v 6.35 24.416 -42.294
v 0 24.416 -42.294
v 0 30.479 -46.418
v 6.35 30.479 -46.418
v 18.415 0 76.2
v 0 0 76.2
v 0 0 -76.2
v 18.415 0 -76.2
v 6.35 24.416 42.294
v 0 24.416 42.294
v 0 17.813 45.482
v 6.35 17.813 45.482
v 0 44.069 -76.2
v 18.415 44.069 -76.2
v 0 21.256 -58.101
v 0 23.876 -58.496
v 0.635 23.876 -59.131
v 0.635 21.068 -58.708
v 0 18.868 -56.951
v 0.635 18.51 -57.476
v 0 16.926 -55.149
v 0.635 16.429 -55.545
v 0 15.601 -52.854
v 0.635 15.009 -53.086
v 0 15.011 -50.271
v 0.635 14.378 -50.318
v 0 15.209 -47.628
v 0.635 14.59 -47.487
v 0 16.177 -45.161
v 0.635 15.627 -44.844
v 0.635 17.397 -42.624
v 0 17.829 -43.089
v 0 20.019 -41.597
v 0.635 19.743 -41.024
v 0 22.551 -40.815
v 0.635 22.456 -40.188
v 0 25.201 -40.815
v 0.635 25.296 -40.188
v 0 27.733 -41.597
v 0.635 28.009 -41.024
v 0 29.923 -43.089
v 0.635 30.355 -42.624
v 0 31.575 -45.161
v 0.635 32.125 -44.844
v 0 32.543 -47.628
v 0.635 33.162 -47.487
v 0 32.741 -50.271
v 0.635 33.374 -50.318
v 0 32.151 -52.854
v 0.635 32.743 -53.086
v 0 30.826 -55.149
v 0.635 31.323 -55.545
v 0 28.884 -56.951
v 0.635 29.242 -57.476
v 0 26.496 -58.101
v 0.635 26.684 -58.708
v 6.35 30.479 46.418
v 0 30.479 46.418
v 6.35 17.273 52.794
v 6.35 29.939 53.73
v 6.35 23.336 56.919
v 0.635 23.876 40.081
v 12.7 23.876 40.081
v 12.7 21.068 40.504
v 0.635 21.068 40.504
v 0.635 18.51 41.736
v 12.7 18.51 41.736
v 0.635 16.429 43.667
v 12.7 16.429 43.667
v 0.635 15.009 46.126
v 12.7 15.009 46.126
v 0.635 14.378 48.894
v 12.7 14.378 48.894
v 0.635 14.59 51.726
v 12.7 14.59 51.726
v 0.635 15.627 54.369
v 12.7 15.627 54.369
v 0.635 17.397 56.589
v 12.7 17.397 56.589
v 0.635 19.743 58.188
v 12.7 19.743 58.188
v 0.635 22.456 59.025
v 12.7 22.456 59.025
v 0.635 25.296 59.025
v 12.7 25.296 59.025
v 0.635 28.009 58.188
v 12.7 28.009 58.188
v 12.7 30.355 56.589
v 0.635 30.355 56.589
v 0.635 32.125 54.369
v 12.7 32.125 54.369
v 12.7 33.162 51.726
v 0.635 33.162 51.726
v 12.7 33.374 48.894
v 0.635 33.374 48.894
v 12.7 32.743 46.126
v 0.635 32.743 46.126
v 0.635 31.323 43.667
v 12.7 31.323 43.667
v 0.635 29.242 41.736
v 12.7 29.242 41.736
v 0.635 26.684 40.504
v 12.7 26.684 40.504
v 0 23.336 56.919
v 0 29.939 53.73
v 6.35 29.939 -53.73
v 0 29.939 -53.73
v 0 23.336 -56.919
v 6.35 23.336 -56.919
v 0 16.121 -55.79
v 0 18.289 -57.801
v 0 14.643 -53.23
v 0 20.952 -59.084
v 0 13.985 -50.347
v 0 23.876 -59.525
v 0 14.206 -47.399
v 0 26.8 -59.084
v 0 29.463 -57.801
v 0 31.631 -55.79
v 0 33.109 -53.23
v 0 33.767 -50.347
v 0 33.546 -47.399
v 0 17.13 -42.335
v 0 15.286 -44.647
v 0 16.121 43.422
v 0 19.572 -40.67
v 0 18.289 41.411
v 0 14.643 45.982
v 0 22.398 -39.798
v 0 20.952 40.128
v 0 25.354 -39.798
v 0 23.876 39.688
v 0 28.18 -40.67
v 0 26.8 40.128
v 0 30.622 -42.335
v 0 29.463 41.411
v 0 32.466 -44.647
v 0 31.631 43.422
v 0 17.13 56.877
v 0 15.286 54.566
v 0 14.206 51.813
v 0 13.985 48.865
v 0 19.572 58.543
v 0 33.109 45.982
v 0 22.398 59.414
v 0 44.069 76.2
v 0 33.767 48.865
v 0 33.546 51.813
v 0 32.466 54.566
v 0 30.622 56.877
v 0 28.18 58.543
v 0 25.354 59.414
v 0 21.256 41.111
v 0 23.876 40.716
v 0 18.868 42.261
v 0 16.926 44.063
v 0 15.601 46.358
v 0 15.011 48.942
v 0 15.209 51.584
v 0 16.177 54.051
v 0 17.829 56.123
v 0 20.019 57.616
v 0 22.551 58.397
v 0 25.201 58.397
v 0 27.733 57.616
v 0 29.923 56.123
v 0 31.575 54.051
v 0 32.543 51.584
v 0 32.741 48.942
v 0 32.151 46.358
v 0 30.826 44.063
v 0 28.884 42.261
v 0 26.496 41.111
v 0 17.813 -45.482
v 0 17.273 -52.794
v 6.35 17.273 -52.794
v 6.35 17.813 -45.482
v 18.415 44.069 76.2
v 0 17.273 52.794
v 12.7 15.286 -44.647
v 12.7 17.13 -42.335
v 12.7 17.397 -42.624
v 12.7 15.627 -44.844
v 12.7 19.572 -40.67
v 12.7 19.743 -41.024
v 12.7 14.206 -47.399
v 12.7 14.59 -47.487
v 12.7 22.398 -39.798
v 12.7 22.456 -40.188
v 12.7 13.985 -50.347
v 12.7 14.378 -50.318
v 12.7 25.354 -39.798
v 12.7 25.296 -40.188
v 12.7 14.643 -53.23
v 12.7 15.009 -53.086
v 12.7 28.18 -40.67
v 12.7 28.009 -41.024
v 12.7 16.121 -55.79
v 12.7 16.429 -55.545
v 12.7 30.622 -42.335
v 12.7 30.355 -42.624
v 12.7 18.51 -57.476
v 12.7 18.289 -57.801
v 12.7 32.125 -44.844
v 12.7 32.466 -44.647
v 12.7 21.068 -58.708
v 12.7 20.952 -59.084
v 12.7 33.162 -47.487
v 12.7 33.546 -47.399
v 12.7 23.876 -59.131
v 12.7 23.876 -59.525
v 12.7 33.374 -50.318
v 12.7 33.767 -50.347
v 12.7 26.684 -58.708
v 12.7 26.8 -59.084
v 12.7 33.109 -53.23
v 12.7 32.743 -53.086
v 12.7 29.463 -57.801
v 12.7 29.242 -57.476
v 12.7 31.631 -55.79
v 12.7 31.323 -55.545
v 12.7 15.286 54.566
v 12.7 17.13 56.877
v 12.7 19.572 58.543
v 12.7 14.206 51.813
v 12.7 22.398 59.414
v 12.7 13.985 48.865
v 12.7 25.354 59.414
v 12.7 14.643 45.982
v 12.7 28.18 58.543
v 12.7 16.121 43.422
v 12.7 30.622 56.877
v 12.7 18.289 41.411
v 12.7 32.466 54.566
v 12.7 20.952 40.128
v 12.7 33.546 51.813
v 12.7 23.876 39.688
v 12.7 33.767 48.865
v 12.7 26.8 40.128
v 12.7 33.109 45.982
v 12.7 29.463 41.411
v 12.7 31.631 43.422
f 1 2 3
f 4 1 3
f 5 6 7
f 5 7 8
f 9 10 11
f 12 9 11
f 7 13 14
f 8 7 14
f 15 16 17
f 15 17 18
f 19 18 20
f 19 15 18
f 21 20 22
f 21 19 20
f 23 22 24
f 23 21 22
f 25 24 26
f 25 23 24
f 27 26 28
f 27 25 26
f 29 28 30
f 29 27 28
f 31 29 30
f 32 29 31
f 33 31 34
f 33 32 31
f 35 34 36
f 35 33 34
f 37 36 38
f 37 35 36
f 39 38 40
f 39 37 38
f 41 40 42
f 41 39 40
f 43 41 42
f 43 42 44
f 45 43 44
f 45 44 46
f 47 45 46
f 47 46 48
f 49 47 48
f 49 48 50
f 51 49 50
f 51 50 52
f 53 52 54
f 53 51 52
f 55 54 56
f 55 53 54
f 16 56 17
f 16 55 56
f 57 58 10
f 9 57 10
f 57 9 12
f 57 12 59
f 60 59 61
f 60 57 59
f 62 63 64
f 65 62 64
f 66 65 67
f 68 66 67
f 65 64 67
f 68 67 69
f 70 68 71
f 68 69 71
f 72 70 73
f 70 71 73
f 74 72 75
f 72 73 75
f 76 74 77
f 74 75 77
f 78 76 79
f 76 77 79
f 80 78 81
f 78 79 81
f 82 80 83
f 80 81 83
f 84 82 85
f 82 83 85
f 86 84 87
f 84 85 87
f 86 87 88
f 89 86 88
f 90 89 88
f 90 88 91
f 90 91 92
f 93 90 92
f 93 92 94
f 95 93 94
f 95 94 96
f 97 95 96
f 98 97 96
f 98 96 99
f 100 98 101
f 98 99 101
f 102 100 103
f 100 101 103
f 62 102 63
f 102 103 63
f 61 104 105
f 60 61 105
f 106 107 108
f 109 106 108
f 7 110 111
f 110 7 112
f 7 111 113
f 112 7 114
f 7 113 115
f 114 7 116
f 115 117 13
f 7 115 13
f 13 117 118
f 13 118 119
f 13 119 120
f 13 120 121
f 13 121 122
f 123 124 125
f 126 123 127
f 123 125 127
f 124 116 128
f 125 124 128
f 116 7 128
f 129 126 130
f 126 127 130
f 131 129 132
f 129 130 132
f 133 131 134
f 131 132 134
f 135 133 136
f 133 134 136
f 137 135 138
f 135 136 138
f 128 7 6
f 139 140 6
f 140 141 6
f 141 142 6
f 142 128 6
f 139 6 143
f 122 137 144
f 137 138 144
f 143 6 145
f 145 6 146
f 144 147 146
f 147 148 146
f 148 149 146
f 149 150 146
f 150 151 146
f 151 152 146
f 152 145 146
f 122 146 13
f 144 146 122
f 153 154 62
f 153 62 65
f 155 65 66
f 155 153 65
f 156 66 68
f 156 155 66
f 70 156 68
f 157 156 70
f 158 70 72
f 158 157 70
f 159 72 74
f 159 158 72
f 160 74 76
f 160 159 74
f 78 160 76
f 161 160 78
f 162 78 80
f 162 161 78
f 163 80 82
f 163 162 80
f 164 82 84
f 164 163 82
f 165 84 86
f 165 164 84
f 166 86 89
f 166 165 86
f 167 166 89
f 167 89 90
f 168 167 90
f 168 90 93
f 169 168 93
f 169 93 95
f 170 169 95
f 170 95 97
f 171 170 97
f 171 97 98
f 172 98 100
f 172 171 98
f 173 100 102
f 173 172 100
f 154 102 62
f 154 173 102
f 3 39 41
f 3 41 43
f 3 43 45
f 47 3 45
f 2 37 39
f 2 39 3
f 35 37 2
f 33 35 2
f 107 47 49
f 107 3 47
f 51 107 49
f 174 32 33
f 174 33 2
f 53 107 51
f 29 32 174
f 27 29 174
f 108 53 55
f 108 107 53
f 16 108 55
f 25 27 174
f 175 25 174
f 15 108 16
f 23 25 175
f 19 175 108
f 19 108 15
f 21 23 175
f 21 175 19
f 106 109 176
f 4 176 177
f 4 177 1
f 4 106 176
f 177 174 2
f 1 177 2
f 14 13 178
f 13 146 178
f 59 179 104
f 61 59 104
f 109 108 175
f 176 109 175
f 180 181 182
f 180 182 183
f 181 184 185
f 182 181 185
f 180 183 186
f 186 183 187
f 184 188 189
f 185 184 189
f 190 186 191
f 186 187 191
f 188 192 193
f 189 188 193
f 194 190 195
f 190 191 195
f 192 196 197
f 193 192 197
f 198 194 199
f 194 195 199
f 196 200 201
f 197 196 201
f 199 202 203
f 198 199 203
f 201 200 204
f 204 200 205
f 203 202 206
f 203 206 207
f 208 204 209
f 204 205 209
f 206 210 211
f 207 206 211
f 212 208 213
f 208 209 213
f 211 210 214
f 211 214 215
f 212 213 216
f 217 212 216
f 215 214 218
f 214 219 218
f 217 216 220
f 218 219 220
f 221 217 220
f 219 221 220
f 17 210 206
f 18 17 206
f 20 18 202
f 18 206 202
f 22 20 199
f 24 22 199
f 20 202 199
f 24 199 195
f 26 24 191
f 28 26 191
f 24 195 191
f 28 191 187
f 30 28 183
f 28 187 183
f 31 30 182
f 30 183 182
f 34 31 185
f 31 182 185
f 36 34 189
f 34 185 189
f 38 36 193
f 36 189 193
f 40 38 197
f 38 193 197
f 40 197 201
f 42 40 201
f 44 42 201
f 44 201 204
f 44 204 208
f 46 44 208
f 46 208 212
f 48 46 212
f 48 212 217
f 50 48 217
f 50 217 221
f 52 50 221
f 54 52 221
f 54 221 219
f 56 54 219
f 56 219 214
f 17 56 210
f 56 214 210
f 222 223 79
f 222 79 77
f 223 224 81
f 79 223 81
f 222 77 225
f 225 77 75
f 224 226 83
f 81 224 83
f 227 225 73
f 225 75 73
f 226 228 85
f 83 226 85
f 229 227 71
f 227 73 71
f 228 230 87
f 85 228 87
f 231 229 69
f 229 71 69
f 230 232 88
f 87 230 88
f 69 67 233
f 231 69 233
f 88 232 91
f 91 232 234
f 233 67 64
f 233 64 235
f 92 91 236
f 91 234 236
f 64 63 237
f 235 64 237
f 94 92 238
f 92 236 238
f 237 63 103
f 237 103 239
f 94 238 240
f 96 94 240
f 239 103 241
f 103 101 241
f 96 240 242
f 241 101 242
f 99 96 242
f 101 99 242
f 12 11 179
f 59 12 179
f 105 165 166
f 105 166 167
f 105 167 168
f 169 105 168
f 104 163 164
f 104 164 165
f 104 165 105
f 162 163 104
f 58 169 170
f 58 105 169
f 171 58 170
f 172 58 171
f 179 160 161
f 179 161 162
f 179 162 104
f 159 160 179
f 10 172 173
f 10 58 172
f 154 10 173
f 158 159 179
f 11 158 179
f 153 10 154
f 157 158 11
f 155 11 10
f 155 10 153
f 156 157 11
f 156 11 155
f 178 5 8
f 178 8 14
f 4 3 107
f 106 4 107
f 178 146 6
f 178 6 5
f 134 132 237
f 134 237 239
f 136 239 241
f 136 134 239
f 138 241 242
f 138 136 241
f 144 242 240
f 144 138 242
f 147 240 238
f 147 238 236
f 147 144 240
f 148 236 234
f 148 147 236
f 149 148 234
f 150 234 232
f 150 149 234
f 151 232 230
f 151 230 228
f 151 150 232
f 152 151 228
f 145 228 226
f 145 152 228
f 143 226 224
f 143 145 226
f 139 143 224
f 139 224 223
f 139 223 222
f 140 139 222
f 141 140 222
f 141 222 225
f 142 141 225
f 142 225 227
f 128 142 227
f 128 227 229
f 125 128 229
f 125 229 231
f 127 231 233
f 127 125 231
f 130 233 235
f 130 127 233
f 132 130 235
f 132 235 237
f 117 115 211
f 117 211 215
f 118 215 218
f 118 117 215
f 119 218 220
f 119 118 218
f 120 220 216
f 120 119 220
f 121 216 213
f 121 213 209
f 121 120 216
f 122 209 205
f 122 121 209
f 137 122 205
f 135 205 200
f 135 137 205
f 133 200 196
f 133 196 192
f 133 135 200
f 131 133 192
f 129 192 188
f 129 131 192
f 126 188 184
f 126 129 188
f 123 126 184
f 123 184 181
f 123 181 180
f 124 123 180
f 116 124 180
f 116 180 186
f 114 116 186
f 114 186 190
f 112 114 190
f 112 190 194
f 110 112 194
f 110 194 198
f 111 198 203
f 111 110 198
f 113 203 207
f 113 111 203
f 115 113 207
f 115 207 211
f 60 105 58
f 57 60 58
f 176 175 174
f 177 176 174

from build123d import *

# Parameters (mm, degrees)
SKETCH1_W           = 18.415
SKETCH1_H           = 44.069
BOSS_EXTRUDE1_DEPTH = 76.2
SKETCH2_R           = 9.9187
CUT_EXTRUDE1_DEPTH  = 12.7
SKETCH3_R           = 9.525
BOSS_EXTRUDE2_DEPTH = 12.7
CUT_EXTRUDE2_DEPTH  = 6.35
CHAMFER1_SIZE       = 0.635


with BuildPart() as part:
    # Sketch1 → Boss-Extrude1 (new, symmetric)
    with BuildSketch(Plane.XY):
        with Locations((9.2075, 22.0345)):
            Rectangle(SKETCH1_W, SKETCH1_H)
    extrude(amount=BOSS_EXTRUDE1_DEPTH, both=True)

    # Sketch2 → Cut-Extrude1 (cut)
    with BuildSketch(Plane(origin=(0, 0, 0), x_dir=(0, 0, -1), z_dir=(1, 0, 0))):
        with Locations((-49.6062, 23.876)):
            Circle(SKETCH2_R)
        with Locations((49.6062, 23.876)):
            Circle(SKETCH2_R)
    extrude(amount=CUT_EXTRUDE1_DEPTH, mode=Mode.SUBTRACT)

    # Sketch3 → Boss-Extrude2 (add)
    with BuildSketch(Plane.ZY.offset(-12.7)):
        with Locations(Location((49.6062, 23.876, 0), (0, 0, 180))):
            Circle(SKETCH3_R)
        with Locations(Location((-49.6062, 23.876, 0), (0, 0, 180))):
            Circle(SKETCH3_R)
    extrude(amount=BOSS_EXTRUDE2_DEPTH)

    # Sketch4 → Cut-Extrude2 (cut)
    with BuildSketch(Plane.ZY):
        Polygon((42.293794683, 24.416427442), (45.481973448, 17.813484954), (52.794378764, 17.273057512), (56.918605317, 23.335572558), (53.730426552, 29.938515046), (46.418021236, 30.478942488), align=None)
        Polygon((-42.293794683, 24.416427442), (-46.418021236, 30.478942488), (-53.730426552, 29.938515046), (-56.918605317, 23.335572558), (-52.794378764, 17.273057512), (-45.481973448, 17.813484954), align=None)
    extrude(amount=-CUT_EXTRUDE2_DEPTH, mode=Mode.SUBTRACT)

    # Chamfer1
    chamfer1_edges = [part.edges().sort_by_distance(p)[0] for p in [
        (0, 23.876, 59.1312),
        (0, 23.876, -40.0812),
    ]]
    chamfer(chamfer1_edges, length=CHAMFER1_SIZE)


solid = part.part
